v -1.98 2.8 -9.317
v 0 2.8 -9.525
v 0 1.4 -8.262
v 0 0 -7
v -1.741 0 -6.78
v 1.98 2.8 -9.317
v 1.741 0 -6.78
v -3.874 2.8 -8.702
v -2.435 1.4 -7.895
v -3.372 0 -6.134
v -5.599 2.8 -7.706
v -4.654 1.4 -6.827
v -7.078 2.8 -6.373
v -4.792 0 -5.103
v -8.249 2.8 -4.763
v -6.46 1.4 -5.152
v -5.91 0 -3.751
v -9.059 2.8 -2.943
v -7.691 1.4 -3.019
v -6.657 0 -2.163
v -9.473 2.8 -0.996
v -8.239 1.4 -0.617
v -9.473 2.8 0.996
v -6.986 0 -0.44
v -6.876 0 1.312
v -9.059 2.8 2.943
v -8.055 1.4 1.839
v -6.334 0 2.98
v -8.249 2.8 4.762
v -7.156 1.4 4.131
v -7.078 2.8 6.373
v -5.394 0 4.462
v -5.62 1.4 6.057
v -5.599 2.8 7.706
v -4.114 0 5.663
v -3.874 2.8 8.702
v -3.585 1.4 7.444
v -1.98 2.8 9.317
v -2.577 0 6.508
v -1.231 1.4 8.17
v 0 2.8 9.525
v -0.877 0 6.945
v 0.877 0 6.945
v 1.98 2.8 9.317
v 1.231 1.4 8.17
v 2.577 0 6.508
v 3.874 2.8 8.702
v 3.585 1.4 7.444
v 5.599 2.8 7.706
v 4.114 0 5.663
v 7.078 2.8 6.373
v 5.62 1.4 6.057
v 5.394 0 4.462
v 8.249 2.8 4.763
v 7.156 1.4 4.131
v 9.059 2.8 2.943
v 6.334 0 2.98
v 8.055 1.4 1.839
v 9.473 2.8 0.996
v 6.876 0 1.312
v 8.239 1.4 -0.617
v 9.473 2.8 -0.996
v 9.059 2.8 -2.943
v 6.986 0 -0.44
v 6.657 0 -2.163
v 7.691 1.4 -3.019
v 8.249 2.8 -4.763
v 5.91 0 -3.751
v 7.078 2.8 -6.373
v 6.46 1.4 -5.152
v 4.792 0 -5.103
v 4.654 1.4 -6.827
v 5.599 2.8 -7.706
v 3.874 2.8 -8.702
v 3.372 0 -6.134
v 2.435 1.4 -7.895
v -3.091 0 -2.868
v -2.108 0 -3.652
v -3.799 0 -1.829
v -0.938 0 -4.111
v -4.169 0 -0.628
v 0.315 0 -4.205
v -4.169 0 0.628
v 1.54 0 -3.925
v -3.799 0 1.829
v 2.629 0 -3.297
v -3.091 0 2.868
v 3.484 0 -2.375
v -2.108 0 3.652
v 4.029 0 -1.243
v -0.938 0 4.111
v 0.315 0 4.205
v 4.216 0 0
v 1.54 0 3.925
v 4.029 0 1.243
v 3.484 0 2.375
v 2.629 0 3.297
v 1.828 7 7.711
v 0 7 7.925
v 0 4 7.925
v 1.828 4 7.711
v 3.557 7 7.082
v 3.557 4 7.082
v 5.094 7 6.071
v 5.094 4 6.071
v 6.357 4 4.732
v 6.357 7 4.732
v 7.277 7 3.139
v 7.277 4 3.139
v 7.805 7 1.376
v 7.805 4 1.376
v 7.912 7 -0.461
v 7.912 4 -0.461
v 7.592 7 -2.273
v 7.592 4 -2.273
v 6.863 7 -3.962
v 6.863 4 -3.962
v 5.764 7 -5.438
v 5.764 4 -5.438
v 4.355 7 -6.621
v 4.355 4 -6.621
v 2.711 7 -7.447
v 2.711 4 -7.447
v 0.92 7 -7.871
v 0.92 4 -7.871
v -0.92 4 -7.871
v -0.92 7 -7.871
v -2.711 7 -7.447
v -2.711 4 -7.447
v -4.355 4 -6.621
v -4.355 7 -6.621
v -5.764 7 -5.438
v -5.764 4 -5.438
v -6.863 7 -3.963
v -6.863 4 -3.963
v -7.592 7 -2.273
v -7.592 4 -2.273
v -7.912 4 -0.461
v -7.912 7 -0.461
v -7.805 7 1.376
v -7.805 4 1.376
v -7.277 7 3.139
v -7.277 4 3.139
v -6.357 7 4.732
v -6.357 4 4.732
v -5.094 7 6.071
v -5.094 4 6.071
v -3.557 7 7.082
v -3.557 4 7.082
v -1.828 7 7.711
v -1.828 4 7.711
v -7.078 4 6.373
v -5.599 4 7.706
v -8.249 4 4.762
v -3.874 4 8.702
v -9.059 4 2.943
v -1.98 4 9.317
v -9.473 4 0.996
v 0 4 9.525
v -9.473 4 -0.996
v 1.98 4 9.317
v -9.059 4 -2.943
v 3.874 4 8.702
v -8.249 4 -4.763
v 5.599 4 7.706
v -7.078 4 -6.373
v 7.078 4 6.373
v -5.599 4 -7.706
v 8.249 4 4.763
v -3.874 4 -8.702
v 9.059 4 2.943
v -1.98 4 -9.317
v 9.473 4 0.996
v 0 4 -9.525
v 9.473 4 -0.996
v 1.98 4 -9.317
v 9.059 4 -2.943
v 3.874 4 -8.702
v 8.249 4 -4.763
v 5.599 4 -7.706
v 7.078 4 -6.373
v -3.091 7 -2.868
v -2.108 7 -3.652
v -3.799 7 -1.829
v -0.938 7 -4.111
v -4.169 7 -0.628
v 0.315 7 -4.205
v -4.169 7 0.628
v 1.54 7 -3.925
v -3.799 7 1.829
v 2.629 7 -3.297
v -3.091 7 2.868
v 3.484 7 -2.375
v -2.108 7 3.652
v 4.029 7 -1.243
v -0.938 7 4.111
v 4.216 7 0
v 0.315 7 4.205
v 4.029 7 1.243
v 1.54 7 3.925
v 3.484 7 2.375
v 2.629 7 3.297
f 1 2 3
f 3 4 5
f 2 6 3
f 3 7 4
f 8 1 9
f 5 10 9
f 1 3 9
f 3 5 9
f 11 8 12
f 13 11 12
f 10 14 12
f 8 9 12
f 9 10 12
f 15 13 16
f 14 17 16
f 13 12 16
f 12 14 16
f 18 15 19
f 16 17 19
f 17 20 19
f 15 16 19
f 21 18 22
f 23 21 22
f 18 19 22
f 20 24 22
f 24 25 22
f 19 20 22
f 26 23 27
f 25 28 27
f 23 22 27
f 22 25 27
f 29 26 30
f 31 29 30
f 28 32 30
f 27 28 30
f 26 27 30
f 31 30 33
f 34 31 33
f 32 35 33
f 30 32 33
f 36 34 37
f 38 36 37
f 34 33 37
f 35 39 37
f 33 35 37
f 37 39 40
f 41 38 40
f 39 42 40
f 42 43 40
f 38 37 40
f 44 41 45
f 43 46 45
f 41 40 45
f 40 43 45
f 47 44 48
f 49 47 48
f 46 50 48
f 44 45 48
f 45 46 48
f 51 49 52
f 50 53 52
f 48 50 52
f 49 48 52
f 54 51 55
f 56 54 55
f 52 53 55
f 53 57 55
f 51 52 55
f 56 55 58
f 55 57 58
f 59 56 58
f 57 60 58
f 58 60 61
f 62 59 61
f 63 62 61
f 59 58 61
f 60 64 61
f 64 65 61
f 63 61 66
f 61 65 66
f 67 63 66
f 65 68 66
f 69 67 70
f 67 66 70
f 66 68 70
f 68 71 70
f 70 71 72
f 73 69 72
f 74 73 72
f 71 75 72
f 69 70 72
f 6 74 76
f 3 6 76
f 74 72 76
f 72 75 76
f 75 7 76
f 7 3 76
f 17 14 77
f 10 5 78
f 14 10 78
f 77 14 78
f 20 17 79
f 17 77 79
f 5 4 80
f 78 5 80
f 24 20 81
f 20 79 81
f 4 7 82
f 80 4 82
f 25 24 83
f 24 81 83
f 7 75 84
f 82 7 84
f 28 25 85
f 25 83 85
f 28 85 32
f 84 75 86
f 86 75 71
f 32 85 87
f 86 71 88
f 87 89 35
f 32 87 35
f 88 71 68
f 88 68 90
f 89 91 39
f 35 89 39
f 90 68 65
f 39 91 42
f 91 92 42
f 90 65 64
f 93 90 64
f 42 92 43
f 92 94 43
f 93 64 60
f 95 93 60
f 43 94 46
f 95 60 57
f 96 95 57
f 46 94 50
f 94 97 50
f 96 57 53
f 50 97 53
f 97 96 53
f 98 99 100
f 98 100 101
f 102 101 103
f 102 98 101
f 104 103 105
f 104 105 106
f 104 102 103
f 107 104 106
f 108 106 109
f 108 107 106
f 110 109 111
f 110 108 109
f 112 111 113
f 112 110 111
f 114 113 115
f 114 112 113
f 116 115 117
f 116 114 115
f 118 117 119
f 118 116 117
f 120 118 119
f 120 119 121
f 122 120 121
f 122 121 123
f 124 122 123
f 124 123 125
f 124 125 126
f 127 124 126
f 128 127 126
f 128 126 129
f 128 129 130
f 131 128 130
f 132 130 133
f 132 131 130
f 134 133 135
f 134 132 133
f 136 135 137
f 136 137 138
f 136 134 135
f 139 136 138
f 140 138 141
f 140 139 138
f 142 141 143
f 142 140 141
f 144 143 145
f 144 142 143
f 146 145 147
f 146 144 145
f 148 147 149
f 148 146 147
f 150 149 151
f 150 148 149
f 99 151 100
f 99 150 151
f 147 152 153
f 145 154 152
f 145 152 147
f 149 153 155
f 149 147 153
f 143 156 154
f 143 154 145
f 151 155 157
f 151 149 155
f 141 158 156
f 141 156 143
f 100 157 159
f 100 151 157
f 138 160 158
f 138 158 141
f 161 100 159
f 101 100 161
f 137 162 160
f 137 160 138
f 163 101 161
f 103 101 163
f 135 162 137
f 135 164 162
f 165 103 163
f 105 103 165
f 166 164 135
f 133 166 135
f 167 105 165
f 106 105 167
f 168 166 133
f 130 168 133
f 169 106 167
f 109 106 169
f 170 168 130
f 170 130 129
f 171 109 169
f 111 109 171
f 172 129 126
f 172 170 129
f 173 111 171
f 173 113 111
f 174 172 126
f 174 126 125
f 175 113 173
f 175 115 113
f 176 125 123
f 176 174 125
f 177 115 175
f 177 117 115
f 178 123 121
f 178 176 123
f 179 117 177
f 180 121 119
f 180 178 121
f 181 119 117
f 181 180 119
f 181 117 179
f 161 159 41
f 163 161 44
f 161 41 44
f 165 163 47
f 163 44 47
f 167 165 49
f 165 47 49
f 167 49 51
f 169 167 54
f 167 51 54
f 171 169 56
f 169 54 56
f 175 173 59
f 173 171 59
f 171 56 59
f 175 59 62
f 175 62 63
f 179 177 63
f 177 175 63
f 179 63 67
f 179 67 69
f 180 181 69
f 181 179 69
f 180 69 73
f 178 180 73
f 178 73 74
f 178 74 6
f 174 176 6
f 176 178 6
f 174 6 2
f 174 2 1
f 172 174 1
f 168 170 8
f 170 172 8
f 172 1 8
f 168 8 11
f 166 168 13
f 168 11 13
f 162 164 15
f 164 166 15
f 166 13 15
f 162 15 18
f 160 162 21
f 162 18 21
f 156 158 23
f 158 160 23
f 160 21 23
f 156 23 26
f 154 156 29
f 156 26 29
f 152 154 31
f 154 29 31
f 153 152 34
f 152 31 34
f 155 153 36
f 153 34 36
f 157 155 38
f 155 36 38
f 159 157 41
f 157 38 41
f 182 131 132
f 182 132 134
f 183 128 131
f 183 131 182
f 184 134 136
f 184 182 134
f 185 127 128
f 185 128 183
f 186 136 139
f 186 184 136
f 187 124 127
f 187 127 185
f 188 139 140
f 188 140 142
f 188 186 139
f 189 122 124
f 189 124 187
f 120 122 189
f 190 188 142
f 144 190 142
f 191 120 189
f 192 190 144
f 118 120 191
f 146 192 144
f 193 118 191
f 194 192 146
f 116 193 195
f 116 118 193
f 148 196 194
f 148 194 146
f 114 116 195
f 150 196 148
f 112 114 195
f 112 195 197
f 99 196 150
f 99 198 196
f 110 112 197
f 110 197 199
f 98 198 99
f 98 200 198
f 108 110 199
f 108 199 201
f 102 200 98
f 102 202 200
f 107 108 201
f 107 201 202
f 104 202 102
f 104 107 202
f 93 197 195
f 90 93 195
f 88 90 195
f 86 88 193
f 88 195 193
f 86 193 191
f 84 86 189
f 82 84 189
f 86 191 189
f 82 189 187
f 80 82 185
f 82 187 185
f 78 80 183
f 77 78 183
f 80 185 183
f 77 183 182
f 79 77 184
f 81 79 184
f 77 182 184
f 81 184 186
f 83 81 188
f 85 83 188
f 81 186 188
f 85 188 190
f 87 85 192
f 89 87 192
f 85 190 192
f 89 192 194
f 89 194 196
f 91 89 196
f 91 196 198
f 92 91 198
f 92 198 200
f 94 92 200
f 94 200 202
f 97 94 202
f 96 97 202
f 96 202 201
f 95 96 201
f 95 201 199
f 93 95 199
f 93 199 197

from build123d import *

# Parameters (mm, degrees)
SKETCH1_R               = 9.525
EXTRUDE1_DEPTH          = 7
SKETCH2_R               = 4
EXTRUDE2_DEPTH          = 16.18062087
F_3_8_24_TAPPED_HOLE2_D = 8.4328
SKETCH3_OUTSIDE_W       = 26.618
SKETCH3_OUTSIDE_H       = 26.618
SKETCH3_OUTSIDE_R       = 7.925
EXTRUDE3_DEPTH          = 3


with BuildPart() as part:
    # Sketch1 → Extrude1 (new body)
    with BuildSketch(Plane(origin=(0, 0, 0), x_dir=(1, 0, 0), z_dir=(0, 1, 0))):
        with Locations(Location((0, 0, 0), (0, 0, 270))):
            Circle(SKETCH1_R)
    extrude(amount=EXTRUDE1_DEPTH)

    # Sketch2 → Extrude2 (cut, through all)
    with BuildSketch(Plane(origin=(0, 0, 0), x_dir=(1, 0, 0), z_dir=(0, 1, 0))):
        Circle(SKETCH2_R)
    extrude(amount=EXTRUDE2_DEPTH, mode=Mode.SUBTRACT)

    # 3_8-24 Tapped Hole2 (through all)
    with Locations(Plane(origin=(0, 0, 0), x_dir=(-1, 0, 0), z_dir=(0, -1, 0))):
        with Locations((0, 0)):
            Hole(F_3_8_24_TAPPED_HOLE2_D / 2)

    # Sketch3 outside → Extrude3 (cut)
    with BuildSketch(Plane(origin=(0, 7, 0), x_dir=(1, 0, 0), z_dir=(0, 1, 0))):
        Rectangle(SKETCH3_OUTSIDE_W, SKETCH3_OUTSIDE_H)
        with Locations(Location((0, 0, 0), (0, 0, 270))):
            Circle(SKETCH3_OUTSIDE_R, mode=Mode.SUBTRACT)
    extrude(amount=-EXTRUDE3_DEPTH, mode=Mode.SUBTRACT)

    # Sketch6 → Cut-Revolve1 (revolve, cut)
    with BuildSketch(Plane.XY, mode=Mode.PRIVATE) as cut_revolve1_sk:
        Polygon((-9.525, 2.8), (-7, 0), (-7, -3.811390031), (-11.858524977, -3.811390031), (-11.858524977, 2.8), align=None)
    revolve(cut_revolve1_sk.sketch.rotate(Axis((0, 0, 0), (0, 1, 0)), 270), axis=Axis((0, 0, 0), (0, 1, 0)), mode=Mode.SUBTRACT)


solid = part.part
